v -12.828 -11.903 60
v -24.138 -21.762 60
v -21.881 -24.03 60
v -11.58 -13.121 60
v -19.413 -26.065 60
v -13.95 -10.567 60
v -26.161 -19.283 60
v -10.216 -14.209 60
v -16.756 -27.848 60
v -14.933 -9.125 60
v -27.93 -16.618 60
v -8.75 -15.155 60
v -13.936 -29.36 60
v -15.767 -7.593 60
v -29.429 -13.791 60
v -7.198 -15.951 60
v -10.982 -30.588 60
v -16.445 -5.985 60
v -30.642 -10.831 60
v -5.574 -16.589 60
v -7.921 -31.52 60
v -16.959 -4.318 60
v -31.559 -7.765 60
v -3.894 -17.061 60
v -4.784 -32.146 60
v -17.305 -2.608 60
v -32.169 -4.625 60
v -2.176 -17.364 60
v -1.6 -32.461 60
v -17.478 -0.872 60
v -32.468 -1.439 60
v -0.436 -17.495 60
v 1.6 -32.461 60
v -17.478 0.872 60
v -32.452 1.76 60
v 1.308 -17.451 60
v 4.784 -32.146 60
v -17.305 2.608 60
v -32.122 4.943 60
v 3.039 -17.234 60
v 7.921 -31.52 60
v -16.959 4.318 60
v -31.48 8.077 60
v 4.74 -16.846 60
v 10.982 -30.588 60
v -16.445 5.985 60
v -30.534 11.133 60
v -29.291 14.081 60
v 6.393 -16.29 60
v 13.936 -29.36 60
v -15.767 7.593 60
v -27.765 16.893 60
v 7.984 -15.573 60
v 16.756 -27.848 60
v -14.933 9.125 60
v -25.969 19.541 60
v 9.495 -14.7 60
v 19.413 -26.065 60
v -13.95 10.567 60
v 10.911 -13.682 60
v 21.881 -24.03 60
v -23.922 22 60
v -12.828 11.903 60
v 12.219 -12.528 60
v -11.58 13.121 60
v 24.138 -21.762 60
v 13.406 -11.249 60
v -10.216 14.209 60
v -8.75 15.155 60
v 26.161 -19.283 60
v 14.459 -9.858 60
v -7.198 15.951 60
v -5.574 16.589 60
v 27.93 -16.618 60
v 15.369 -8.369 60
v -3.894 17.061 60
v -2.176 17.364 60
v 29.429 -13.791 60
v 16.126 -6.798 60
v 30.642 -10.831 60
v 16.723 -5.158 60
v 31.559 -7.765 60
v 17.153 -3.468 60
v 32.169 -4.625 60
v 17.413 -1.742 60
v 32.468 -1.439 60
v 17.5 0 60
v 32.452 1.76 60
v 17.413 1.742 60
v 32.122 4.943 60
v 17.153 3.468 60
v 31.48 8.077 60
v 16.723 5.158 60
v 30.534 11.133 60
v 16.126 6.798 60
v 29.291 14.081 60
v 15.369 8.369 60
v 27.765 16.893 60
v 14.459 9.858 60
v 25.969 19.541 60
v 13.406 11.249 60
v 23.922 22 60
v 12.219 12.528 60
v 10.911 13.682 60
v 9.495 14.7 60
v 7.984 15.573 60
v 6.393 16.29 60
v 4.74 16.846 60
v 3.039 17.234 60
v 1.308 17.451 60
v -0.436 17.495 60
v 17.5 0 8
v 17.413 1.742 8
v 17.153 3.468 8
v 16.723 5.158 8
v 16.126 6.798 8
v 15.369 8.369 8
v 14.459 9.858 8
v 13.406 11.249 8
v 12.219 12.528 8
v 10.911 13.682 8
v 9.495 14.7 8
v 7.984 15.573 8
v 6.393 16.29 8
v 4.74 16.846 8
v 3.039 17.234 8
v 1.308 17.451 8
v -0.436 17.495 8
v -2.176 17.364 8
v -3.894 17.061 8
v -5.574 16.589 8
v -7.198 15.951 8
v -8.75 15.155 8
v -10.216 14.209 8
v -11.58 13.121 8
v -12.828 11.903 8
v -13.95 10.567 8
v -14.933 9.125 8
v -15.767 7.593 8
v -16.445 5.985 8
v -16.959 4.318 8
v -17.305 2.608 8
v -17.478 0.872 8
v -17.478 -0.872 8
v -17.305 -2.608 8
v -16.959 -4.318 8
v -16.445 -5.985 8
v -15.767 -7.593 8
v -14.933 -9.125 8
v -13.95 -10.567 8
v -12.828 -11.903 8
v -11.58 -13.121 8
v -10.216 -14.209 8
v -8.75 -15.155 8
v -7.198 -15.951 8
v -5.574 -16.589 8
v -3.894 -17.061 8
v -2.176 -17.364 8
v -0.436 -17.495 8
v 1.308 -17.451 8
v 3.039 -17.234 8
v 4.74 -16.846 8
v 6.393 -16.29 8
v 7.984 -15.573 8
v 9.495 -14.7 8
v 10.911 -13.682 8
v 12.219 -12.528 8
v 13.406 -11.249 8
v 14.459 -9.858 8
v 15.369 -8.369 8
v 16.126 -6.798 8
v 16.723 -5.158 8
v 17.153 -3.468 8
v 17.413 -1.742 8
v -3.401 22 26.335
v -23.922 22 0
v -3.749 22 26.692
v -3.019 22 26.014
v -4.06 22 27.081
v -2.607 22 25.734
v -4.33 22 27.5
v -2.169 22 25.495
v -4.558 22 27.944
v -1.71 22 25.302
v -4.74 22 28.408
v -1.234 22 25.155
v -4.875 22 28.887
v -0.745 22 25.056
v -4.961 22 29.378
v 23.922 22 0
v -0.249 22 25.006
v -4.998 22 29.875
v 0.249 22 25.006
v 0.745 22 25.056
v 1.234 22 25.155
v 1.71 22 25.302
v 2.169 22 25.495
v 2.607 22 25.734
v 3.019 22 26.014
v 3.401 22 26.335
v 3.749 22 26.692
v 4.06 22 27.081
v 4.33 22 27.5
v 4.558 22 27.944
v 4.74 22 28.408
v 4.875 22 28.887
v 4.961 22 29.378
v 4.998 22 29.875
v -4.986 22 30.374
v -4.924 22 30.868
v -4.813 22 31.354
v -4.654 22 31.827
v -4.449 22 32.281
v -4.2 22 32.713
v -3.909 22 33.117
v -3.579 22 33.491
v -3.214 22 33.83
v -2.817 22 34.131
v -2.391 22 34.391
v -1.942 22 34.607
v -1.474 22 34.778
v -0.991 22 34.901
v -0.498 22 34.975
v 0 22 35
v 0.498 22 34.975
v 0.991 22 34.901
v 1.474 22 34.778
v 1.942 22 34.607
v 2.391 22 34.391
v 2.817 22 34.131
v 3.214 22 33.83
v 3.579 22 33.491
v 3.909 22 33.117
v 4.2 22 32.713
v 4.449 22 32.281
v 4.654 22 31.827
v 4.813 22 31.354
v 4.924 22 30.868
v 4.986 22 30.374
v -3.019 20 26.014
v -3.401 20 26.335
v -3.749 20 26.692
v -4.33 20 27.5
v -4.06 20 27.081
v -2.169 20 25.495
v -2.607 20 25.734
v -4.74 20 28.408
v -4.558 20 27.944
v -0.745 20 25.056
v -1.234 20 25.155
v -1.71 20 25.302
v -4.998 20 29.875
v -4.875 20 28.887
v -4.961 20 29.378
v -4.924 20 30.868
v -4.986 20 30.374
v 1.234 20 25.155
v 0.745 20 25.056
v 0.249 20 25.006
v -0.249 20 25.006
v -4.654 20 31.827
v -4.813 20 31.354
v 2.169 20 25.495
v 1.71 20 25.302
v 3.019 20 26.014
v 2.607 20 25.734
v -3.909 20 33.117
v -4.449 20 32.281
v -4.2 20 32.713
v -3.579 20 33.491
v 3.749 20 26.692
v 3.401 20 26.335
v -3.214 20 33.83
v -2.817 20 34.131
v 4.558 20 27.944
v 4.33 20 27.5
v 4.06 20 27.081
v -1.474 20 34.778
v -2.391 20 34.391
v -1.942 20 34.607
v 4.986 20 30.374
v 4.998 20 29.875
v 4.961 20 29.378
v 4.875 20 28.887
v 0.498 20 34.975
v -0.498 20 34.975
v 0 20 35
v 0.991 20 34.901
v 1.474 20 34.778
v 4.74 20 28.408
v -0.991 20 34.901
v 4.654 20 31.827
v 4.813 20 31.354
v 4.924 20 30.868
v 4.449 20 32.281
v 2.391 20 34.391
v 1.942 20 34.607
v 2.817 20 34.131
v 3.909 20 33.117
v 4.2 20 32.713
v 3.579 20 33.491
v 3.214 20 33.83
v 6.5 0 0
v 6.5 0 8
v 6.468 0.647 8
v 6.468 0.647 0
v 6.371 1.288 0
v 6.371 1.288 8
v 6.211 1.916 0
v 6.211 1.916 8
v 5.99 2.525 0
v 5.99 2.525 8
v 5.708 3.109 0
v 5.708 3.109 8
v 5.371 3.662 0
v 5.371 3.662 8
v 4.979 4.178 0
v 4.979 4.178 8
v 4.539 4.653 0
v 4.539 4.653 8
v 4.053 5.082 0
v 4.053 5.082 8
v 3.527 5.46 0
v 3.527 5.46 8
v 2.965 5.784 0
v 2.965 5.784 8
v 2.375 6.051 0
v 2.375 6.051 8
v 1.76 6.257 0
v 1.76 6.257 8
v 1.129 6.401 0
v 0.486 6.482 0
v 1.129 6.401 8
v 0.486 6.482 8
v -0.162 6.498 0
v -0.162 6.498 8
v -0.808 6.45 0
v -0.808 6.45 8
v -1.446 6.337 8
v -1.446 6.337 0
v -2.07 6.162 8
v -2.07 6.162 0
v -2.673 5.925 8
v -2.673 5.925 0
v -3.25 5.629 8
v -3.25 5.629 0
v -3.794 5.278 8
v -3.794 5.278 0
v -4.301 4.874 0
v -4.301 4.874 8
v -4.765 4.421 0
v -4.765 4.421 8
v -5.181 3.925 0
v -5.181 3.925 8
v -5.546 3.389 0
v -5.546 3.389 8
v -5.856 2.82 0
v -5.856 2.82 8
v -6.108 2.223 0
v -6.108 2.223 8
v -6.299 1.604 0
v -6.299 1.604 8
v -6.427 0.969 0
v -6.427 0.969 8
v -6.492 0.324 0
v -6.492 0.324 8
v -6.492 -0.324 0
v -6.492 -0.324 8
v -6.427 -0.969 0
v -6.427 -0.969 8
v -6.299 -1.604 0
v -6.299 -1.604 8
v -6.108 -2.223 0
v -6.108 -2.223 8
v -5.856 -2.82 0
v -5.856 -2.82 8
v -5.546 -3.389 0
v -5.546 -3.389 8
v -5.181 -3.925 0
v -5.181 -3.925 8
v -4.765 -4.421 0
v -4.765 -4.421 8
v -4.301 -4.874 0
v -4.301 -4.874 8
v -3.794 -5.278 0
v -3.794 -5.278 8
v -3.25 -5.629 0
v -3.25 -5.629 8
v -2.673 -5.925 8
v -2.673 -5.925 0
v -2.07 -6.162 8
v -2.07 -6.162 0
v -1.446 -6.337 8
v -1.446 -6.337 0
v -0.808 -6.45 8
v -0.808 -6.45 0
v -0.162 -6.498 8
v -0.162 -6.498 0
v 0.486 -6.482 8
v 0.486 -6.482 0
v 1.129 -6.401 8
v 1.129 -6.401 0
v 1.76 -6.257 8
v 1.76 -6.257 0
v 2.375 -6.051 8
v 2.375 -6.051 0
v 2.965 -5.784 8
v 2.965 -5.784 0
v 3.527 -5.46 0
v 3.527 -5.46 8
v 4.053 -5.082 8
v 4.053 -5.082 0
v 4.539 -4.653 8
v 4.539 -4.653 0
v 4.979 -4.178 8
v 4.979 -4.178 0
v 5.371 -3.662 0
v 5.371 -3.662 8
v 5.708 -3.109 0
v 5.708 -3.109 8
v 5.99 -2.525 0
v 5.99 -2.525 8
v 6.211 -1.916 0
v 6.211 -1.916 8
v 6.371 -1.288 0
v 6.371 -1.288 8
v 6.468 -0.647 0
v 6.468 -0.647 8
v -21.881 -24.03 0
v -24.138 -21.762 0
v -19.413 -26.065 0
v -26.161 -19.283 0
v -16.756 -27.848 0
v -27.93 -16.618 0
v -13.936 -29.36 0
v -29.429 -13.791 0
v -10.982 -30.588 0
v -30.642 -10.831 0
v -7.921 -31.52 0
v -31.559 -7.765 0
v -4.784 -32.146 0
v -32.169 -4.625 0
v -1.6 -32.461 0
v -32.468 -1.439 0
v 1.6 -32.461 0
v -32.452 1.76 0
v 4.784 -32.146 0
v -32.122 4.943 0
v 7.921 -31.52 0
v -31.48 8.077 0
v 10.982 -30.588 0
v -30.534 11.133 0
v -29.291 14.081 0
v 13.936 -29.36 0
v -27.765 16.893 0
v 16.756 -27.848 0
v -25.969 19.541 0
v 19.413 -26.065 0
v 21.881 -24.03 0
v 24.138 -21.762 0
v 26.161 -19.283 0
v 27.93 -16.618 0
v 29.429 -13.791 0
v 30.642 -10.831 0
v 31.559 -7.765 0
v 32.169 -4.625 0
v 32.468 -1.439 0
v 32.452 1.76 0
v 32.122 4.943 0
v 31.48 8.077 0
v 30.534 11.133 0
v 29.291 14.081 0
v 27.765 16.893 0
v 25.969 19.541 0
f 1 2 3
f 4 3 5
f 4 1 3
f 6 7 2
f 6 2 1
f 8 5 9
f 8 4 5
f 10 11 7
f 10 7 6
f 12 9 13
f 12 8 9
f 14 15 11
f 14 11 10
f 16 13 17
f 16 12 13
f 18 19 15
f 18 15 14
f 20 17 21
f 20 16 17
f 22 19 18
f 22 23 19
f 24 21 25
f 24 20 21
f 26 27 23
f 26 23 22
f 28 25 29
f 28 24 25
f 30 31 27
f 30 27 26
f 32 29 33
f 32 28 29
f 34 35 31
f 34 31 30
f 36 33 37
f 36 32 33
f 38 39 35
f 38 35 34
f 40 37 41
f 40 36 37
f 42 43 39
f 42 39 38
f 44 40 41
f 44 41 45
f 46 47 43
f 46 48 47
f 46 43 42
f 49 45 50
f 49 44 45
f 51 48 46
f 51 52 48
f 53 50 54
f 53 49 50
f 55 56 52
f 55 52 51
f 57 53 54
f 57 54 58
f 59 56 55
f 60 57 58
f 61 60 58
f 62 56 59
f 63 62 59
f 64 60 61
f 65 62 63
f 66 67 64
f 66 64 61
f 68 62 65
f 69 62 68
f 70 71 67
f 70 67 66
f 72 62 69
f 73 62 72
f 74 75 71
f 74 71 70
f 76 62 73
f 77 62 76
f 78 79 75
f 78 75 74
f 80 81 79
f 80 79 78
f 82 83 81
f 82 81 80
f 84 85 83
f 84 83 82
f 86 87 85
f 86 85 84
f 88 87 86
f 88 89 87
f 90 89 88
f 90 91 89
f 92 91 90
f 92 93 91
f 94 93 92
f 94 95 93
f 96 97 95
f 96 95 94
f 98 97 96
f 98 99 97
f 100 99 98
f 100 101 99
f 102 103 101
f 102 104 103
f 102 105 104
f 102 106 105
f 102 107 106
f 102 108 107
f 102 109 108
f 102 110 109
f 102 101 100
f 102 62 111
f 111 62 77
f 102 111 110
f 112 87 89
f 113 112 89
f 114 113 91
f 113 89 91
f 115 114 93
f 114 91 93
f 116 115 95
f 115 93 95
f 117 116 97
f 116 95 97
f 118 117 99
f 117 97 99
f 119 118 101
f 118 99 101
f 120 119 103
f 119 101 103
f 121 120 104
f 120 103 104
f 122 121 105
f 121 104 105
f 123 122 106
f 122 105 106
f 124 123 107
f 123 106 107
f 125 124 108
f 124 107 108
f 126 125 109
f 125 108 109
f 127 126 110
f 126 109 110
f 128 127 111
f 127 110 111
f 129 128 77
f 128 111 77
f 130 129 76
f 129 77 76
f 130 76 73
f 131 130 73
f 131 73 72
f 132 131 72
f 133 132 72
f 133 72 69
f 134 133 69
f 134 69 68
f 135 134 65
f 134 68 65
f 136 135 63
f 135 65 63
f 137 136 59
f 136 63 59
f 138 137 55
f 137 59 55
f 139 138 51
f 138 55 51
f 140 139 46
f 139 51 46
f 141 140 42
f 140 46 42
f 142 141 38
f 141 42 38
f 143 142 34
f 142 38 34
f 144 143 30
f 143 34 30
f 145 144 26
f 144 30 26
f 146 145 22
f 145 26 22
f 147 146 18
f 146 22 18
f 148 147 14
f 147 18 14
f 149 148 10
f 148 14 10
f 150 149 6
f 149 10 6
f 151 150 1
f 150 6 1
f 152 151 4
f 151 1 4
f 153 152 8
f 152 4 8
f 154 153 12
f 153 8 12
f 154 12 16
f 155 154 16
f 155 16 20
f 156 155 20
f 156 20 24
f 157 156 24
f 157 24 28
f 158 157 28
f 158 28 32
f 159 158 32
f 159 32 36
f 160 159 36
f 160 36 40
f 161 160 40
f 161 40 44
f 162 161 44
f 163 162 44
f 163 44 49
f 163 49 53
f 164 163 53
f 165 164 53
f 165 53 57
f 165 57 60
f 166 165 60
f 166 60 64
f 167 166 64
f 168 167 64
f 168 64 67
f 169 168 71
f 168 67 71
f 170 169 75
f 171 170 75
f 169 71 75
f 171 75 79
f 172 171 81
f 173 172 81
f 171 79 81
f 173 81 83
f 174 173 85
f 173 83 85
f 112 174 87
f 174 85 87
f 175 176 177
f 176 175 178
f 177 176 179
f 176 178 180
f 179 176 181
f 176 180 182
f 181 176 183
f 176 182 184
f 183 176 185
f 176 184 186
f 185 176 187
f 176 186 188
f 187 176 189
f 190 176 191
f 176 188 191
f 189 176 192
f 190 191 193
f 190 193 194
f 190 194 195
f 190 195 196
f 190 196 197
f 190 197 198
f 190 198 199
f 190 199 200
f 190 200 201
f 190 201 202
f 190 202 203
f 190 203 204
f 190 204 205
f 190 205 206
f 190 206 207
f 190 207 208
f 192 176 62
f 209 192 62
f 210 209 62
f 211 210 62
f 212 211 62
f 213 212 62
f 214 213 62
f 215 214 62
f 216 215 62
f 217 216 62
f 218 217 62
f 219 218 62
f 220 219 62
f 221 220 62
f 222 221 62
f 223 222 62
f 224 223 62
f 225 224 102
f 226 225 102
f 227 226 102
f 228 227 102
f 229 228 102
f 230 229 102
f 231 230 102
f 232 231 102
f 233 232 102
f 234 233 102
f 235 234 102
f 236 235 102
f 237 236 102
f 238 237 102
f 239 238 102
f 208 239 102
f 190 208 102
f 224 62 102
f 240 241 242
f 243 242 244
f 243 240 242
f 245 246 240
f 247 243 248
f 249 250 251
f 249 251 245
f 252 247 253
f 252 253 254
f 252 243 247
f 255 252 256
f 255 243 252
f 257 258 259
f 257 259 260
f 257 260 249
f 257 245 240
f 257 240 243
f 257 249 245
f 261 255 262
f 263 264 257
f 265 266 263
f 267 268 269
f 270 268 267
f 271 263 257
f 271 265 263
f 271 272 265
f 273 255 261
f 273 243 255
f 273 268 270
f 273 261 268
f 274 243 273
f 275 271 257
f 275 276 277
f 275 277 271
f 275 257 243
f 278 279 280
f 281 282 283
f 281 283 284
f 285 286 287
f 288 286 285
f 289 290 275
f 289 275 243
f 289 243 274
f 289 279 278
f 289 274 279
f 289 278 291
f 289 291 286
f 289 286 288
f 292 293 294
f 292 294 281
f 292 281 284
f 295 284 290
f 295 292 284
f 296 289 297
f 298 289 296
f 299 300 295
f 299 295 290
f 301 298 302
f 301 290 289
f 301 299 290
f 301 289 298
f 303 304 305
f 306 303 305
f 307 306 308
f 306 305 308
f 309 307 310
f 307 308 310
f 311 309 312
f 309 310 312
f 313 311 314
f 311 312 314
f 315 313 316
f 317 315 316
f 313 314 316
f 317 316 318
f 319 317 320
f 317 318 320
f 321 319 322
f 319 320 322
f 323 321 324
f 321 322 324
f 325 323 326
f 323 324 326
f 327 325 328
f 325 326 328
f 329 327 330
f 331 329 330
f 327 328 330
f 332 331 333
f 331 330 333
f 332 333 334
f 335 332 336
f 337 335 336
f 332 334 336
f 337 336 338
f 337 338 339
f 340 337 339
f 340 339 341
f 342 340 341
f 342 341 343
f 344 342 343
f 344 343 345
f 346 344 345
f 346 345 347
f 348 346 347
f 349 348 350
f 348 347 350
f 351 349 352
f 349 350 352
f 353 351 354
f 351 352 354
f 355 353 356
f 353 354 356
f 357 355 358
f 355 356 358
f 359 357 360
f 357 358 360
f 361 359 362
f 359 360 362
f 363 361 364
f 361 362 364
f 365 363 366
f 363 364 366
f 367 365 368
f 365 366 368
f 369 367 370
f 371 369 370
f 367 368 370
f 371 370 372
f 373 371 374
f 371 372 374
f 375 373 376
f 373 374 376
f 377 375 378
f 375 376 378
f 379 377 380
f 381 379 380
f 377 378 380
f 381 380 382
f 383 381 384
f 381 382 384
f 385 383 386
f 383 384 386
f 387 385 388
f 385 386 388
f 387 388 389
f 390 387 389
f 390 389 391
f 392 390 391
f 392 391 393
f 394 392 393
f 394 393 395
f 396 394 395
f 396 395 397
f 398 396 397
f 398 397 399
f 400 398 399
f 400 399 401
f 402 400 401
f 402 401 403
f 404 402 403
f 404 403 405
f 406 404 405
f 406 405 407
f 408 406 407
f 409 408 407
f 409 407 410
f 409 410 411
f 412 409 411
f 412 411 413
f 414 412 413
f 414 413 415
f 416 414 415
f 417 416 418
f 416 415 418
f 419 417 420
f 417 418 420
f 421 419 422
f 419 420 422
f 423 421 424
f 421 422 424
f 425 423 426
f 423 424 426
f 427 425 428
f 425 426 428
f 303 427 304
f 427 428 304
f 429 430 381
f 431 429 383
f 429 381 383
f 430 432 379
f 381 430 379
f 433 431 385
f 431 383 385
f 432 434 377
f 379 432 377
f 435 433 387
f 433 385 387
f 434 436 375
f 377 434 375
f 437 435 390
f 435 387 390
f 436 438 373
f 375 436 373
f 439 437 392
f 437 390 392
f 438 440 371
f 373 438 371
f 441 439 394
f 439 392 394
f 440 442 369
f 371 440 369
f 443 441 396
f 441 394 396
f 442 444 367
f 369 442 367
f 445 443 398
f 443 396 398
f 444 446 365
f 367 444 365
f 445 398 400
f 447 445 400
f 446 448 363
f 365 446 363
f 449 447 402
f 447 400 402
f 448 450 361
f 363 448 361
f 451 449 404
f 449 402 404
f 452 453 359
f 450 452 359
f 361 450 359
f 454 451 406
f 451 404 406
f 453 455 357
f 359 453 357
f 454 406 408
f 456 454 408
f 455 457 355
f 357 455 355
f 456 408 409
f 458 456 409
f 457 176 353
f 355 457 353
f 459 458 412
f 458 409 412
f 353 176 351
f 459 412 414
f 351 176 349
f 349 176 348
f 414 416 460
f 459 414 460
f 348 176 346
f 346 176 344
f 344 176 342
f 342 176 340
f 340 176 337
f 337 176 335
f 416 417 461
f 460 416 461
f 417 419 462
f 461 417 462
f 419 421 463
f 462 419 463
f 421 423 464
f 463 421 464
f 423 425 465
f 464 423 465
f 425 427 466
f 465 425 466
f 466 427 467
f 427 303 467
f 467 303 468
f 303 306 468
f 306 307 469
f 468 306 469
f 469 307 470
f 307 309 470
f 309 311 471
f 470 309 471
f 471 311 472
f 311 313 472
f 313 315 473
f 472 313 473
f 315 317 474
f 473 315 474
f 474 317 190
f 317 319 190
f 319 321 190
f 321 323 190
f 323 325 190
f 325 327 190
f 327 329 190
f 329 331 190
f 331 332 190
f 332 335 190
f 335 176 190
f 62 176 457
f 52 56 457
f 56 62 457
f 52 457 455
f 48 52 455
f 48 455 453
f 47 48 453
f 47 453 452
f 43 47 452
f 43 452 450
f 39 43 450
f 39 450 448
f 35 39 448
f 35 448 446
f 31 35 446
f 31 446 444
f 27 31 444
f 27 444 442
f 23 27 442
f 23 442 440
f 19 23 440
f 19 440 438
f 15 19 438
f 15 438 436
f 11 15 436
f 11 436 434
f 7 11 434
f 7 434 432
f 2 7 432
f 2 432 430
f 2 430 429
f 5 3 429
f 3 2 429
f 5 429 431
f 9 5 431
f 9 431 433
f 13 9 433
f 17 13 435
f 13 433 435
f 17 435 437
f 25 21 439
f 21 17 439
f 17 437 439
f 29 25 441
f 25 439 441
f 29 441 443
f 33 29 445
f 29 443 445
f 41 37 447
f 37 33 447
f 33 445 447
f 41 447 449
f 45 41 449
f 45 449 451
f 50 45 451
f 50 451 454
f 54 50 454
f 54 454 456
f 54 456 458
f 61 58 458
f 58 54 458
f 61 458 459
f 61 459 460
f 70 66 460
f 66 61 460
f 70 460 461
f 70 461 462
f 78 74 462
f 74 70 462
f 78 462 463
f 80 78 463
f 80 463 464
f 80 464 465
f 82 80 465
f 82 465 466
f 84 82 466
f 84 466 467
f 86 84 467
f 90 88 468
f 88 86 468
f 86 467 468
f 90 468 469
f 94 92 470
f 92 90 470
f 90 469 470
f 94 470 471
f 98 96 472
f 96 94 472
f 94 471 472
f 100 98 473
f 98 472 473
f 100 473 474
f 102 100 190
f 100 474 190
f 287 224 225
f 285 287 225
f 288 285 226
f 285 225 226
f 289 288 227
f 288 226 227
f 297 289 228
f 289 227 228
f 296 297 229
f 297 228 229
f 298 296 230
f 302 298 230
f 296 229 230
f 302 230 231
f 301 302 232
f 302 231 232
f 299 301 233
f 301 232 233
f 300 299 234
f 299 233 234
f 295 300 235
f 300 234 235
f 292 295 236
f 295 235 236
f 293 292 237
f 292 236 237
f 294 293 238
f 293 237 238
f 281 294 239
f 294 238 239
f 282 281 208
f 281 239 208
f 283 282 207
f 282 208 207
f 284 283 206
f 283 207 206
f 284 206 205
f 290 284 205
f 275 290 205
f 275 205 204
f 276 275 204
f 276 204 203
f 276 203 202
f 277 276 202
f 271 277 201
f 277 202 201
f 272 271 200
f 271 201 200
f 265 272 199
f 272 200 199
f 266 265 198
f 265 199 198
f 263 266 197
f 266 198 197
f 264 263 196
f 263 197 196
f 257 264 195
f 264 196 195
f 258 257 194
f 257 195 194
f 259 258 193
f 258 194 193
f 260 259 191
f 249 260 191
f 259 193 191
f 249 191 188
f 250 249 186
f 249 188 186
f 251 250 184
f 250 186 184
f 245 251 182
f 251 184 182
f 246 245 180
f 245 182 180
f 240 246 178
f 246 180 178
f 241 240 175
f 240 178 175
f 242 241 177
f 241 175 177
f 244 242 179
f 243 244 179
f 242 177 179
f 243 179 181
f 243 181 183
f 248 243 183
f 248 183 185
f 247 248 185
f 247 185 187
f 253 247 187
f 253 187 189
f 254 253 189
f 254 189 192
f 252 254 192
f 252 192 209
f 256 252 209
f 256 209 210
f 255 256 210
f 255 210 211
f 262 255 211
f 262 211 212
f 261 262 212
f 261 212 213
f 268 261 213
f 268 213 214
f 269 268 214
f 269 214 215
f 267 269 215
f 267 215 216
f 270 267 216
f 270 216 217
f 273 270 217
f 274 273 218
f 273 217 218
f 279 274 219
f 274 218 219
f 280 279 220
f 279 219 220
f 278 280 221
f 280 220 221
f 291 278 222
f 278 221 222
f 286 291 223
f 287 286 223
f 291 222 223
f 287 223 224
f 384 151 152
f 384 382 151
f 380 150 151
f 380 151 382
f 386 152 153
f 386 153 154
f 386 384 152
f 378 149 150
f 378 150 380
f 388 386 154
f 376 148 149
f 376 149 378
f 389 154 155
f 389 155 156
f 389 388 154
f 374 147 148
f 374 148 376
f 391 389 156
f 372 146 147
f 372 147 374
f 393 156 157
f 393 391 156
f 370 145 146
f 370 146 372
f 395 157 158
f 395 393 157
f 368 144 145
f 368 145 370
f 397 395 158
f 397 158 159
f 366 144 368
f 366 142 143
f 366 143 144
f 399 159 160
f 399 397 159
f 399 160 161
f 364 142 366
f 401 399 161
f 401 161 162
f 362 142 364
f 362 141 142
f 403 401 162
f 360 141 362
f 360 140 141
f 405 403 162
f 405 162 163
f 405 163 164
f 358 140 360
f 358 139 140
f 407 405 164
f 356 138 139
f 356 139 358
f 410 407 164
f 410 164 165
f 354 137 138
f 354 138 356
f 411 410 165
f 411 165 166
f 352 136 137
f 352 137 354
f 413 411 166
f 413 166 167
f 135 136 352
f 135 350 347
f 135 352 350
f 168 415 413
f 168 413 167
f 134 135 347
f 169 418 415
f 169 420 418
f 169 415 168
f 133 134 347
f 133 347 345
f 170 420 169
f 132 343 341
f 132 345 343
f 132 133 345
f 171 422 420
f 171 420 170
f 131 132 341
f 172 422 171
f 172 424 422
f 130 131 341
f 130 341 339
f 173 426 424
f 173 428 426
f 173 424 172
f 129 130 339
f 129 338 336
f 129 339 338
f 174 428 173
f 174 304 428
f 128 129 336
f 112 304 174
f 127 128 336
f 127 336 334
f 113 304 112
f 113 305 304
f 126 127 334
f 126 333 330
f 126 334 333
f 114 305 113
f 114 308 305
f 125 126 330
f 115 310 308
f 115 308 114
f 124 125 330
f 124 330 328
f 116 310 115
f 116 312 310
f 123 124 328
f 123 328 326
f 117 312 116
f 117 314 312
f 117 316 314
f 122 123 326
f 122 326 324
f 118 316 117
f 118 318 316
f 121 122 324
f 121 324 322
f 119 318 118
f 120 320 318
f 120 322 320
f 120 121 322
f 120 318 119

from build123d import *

# Parameters (mm, degrees)
SKETCH1_R           = 32.5
BOSS_EXTRUDE1_DEPTH = 60
SKETCH3_R           = 17.5
CUT_EXTRUDE4_DEPTH  = 52
SKETCH6_R           = 6.5
CUT_EXTRUDE5_DEPTH  = 8
SKETCH8_W           = 65.355871795
SKETCH8_H           = 11.921493712
CUT_EXTRUDE6_DEPTH  = 60
SKETCH9_R           = 5
CUT_EXTRUDE9_DEPTH  = 2


with BuildPart() as part:
    # Sketch1 → Boss-Extrude1 (new body)
    with BuildSketch(Plane.XY):
        Circle(SKETCH1_R)
    extrude(amount=BOSS_EXTRUDE1_DEPTH)

    # Sketch3 → Cut-Extrude4 (cut)
    with BuildSketch(Plane.XY.offset(60)):
        Circle(SKETCH3_R)
    extrude(amount=-CUT_EXTRUDE4_DEPTH, mode=Mode.SUBTRACT)

    # Sketch6 → Cut-Extrude5 (cut)
    with BuildSketch(Plane.XY.offset(8)):
        Circle(SKETCH6_R)
    extrude(amount=-CUT_EXTRUDE5_DEPTH, mode=Mode.SUBTRACT)

    # Sketch8 → Cut-Extrude6 (cut)
    with BuildSketch(Plane.XY.offset(60)):
        with Locations((-1.31264436, 27.960746856)):
            Rectangle(SKETCH8_W, SKETCH8_H)
    extrude(amount=-CUT_EXTRUDE6_DEPTH, mode=Mode.SUBTRACT)

    # Sketch9 → Cut-Extrude9 (cut)
    with BuildSketch(Plane(origin=(0, 22, 0), x_dir=(1, 0, 0), z_dir=(0, 1, 0))):
        with Locations(Location((0, -30, 0), (0, 0, 270))):  # turned: the seam where the file's is
            Circle(SKETCH9_R)
    extrude(amount=-CUT_EXTRUDE9_DEPTH, mode=Mode.SUBTRACT)


solid = part.part
